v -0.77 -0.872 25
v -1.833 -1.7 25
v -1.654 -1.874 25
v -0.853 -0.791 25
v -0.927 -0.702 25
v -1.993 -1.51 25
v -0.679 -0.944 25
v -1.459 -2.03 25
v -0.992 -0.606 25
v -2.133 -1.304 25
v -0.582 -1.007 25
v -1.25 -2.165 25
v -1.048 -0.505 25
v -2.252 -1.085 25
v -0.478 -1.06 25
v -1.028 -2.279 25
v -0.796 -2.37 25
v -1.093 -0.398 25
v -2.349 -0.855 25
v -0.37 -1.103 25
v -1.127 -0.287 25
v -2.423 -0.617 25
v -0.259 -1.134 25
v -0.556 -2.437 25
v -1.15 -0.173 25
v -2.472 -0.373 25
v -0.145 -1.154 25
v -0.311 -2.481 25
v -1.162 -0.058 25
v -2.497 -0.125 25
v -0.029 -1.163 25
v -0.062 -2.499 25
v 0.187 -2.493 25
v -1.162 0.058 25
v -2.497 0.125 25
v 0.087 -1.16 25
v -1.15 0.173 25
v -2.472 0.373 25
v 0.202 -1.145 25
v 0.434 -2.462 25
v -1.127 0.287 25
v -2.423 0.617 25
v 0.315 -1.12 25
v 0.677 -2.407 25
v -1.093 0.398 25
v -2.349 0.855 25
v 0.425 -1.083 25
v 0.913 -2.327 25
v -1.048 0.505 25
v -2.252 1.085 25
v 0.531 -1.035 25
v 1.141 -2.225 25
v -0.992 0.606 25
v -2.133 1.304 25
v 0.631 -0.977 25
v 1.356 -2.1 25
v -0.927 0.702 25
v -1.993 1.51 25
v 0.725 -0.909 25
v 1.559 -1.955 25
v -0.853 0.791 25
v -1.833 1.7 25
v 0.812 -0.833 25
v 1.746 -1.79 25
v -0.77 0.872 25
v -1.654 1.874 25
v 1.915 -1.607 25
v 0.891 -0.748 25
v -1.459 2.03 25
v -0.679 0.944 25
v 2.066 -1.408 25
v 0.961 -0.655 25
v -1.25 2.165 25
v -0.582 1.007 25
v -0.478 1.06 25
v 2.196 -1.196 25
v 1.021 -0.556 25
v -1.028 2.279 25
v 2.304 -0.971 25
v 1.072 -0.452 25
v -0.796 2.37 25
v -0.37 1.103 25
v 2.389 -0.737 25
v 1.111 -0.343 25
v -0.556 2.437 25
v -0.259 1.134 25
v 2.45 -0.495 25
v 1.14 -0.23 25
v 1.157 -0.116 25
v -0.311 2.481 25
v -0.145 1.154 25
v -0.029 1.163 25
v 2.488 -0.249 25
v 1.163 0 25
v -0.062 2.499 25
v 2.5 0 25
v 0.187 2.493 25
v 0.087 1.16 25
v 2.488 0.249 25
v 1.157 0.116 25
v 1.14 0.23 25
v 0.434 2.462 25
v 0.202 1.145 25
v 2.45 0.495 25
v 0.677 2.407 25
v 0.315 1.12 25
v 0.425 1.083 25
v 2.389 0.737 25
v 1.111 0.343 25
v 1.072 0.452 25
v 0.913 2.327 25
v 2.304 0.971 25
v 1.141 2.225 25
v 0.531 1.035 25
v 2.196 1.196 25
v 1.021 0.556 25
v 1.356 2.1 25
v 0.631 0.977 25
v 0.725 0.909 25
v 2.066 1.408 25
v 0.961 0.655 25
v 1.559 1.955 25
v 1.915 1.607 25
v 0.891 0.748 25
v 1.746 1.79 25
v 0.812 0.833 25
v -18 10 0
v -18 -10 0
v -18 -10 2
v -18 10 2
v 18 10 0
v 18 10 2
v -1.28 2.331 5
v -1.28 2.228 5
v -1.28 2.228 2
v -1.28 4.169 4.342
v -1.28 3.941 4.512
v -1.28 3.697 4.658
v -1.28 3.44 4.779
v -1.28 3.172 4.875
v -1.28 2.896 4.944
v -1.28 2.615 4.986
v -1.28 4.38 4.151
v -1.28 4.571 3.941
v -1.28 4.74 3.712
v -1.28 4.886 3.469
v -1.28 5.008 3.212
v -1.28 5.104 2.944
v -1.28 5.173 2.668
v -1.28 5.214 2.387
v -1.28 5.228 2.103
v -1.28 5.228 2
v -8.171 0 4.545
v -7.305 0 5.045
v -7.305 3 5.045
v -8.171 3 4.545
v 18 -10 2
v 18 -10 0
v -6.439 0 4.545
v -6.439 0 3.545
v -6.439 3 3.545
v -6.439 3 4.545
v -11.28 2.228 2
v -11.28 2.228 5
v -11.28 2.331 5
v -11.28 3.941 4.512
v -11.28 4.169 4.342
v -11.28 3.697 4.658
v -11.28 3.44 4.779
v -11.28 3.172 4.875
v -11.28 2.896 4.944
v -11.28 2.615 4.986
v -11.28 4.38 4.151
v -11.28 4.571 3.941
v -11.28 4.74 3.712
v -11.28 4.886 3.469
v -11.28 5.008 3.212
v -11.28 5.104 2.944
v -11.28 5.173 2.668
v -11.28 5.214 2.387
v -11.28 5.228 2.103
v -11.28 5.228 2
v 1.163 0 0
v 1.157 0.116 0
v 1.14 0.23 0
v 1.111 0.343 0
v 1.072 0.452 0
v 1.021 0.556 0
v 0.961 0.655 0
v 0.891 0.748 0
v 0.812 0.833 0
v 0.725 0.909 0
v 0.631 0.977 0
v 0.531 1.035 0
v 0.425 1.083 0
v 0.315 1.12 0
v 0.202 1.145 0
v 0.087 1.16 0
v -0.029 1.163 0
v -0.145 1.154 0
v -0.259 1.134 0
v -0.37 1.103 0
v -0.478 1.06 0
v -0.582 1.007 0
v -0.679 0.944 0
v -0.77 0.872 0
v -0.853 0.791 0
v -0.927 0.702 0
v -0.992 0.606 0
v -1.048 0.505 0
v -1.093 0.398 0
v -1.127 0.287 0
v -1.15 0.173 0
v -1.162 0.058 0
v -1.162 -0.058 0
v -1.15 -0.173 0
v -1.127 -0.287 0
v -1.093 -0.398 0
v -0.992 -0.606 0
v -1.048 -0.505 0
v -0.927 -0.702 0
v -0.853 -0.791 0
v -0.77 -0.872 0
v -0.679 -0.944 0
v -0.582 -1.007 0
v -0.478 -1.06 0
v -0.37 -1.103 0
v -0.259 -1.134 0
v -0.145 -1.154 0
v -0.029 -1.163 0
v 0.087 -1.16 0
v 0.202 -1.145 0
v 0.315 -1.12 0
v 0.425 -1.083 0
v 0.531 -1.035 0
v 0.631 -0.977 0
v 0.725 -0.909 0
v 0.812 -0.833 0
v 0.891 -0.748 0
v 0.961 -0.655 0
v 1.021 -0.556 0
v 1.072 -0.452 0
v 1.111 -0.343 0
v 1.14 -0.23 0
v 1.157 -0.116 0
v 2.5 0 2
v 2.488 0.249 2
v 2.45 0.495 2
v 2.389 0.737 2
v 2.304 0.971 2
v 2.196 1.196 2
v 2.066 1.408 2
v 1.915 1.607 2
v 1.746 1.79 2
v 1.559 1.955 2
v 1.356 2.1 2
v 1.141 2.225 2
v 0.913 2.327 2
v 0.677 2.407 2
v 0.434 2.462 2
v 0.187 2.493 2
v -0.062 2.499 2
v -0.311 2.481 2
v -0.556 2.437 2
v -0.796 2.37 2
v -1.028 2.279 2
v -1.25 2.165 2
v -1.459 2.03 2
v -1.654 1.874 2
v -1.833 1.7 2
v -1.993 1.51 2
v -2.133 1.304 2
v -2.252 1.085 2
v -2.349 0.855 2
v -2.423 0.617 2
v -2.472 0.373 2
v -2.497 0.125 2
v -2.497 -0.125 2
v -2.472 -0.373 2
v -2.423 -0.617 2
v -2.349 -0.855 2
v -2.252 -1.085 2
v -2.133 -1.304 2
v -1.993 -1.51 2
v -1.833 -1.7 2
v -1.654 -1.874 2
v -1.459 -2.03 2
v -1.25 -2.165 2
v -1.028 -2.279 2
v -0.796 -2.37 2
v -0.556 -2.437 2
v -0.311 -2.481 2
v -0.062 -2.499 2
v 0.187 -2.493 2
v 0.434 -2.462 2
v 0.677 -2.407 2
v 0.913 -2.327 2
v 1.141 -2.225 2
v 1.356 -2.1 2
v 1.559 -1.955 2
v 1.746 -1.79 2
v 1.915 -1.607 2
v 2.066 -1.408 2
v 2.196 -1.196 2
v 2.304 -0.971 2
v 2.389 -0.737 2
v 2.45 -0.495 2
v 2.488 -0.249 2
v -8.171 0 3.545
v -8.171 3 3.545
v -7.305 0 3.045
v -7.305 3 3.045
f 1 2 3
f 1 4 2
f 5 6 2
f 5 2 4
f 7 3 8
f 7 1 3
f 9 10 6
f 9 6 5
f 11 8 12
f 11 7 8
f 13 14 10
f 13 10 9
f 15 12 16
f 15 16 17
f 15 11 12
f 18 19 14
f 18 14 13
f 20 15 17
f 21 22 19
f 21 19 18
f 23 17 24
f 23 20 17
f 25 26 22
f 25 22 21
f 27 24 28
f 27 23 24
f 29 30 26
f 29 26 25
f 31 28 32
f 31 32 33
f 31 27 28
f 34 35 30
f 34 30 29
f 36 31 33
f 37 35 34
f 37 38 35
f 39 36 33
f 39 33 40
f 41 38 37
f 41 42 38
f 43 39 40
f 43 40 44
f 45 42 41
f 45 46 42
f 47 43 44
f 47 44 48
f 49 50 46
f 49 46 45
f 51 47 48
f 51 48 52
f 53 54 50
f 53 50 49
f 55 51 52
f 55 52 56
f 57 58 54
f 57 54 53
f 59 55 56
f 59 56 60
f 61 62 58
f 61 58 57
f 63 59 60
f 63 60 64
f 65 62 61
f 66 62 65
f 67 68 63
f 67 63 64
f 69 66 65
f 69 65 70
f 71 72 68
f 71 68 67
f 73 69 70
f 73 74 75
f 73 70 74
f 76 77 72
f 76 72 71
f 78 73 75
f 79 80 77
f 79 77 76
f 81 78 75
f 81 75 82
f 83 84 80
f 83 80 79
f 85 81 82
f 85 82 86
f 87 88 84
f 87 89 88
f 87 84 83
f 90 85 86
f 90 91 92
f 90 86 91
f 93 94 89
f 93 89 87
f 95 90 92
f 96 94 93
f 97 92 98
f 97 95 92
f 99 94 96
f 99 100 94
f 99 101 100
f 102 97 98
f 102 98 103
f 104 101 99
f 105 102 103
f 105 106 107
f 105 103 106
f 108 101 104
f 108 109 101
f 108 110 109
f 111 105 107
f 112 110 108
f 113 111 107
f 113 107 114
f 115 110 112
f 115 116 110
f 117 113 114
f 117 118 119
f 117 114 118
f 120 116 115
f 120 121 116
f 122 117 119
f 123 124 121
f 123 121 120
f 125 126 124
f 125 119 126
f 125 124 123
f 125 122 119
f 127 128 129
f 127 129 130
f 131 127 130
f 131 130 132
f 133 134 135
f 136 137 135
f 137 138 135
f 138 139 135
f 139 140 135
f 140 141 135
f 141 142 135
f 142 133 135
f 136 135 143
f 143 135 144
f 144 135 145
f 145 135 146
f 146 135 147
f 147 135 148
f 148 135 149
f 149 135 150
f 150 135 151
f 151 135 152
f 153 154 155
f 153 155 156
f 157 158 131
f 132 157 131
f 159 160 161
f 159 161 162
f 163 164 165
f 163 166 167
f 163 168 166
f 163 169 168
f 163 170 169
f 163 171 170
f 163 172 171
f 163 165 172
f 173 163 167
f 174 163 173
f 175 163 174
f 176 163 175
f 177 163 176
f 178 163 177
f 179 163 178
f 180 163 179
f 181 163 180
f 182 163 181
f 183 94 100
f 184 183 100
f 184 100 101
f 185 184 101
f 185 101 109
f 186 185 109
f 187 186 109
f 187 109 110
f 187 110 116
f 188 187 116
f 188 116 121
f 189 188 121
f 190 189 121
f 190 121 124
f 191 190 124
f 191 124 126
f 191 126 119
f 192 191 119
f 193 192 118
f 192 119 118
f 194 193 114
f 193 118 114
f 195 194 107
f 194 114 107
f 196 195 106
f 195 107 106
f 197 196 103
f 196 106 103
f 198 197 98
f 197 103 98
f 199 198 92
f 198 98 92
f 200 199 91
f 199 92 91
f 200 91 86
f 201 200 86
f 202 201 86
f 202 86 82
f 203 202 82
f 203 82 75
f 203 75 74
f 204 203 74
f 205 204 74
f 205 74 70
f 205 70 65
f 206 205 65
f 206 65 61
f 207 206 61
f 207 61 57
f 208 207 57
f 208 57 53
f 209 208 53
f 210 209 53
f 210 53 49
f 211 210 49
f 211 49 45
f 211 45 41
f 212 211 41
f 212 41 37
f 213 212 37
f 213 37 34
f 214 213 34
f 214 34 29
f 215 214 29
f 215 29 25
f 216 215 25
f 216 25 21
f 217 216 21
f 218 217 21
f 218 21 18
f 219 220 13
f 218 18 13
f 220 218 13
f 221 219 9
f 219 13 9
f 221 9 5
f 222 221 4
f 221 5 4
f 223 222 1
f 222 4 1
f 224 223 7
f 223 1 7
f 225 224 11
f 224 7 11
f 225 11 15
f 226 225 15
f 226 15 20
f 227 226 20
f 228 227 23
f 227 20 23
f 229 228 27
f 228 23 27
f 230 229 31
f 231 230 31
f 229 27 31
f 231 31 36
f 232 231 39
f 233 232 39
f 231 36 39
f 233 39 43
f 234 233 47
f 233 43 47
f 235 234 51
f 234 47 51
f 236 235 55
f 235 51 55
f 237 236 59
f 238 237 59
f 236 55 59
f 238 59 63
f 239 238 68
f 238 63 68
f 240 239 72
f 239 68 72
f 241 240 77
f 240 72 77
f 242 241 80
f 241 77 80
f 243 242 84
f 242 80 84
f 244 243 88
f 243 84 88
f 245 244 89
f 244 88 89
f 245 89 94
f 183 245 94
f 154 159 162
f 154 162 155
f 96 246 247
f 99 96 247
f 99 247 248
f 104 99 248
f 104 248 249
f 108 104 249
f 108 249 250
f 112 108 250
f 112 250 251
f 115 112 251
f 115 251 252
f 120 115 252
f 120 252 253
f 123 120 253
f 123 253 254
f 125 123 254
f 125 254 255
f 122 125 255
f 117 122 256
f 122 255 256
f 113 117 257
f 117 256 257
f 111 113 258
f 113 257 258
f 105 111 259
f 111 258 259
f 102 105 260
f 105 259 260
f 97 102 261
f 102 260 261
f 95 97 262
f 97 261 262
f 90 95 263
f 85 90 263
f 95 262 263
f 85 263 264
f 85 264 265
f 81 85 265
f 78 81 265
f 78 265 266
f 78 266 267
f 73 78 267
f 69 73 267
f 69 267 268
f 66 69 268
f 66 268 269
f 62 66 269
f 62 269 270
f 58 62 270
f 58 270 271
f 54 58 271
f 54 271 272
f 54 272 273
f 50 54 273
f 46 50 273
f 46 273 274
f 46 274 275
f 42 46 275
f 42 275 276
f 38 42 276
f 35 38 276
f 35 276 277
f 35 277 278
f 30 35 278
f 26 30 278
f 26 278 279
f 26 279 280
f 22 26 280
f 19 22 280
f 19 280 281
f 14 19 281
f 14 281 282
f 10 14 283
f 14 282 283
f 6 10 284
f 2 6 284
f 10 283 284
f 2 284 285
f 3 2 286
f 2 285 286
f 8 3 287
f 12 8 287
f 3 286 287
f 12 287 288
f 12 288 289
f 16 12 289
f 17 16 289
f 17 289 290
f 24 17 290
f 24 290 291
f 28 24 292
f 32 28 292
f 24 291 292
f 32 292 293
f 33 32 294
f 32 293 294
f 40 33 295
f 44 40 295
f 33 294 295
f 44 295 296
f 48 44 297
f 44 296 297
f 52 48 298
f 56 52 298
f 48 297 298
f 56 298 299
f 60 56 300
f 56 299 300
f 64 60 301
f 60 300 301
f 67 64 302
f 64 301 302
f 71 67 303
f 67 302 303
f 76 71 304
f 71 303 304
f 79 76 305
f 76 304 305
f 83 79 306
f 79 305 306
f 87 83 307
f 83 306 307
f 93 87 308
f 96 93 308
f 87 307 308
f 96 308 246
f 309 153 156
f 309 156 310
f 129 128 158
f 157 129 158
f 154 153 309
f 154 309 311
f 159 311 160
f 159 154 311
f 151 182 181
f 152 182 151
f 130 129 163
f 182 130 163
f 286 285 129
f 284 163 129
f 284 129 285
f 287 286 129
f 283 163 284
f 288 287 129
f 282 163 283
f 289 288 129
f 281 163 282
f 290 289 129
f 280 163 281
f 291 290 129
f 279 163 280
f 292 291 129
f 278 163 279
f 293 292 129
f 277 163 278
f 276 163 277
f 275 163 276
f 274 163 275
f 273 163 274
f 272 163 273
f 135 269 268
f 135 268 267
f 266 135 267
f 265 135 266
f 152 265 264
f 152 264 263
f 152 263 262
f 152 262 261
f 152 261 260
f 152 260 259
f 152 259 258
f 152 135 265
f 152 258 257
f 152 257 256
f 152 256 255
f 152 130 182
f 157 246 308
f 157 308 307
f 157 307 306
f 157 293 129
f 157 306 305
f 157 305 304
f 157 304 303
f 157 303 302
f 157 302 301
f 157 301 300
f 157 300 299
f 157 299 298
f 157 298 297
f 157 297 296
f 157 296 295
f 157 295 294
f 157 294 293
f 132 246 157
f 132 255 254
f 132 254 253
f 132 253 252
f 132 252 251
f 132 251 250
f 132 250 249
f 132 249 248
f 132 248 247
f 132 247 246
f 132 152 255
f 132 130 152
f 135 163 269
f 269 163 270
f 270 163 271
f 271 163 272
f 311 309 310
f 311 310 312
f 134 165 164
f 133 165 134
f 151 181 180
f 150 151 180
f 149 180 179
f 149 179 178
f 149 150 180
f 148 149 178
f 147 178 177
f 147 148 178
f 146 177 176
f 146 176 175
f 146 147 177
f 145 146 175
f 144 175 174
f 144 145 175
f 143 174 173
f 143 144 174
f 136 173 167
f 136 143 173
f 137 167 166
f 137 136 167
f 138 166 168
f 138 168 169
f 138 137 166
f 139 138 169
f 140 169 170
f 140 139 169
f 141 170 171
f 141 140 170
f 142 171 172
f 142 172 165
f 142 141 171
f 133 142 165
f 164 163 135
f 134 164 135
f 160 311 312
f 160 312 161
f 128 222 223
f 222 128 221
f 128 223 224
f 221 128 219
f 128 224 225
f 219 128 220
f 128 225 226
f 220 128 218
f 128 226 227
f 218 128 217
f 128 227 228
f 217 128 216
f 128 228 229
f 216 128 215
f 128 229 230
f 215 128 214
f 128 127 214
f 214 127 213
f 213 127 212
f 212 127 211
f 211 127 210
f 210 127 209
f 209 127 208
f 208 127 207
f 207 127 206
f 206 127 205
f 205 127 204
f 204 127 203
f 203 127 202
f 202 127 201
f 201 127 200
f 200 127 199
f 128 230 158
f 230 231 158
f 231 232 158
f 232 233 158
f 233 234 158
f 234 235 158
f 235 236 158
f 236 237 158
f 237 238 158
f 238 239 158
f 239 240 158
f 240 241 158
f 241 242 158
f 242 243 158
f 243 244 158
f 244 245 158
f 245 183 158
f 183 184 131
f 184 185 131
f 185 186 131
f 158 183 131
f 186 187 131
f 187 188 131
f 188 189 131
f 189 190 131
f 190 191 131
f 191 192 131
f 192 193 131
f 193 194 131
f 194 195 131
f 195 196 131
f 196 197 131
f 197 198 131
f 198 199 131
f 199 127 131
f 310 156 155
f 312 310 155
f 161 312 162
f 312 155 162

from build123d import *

# Parameters (mm, degrees)
F0_W      = 36
F0_H      = 20
F2_DEPTH  = 2
F1_W      = 10
F1_H      = 3
F3_DEPTH  = 5
F4_R      = 2.897056
F6_DEPTH  = 3
F7_R      = 2.5
F8_DEPTH  = 25
F9_R      = 1.163091
F10_DEPTH = 30


with BuildPart() as f2:
    # F0 (on Top) → F2 (new body)
    with BuildSketch(Plane.XY):
        Rectangle(F0_W, F0_H)
    extrude(amount=F2_DEPTH)

    # F1 (on Top) → F3 (join)
    with BuildSketch(Plane.XY):
        with Locations((-6.279705, 3.728283)):
            Rectangle(F1_W, F1_H)
    extrude(amount=F3_DEPTH)

    # F4
    f4_edges = [f2.edges().sort_by_distance(p)[0] for p in [
        (-6.279705, 5.228283, 5),
    ]]
    fillet(f4_edges, radius=F4_R)

    # F7 (on Top) → F8 (join)
    with BuildSketch(Plane.XY):
        Circle(F7_R)
    extrude(amount=F8_DEPTH)

    # F9 (on face) → F10 (cut)
    with BuildSketch(Plane.XY.offset(25)):
        Circle(F9_R)
    extrude(amount=-F10_DEPTH, mode=Mode.SUBTRACT)


with BuildPart() as f6:
    # F5 (on Front) → F6 (new body)
    with BuildSketch(Plane.XZ):
        Polygon((-6.439249, 3.544959), (-6.439249, 4.544959), (-7.305274, 5.044959), (-8.1713, 4.544959), (-8.1713, 3.544959), (-7.305274, 3.044959), align=None)
    extrude(amount=-F6_DEPTH)


solid = Compound([f2.part, f6.part])
